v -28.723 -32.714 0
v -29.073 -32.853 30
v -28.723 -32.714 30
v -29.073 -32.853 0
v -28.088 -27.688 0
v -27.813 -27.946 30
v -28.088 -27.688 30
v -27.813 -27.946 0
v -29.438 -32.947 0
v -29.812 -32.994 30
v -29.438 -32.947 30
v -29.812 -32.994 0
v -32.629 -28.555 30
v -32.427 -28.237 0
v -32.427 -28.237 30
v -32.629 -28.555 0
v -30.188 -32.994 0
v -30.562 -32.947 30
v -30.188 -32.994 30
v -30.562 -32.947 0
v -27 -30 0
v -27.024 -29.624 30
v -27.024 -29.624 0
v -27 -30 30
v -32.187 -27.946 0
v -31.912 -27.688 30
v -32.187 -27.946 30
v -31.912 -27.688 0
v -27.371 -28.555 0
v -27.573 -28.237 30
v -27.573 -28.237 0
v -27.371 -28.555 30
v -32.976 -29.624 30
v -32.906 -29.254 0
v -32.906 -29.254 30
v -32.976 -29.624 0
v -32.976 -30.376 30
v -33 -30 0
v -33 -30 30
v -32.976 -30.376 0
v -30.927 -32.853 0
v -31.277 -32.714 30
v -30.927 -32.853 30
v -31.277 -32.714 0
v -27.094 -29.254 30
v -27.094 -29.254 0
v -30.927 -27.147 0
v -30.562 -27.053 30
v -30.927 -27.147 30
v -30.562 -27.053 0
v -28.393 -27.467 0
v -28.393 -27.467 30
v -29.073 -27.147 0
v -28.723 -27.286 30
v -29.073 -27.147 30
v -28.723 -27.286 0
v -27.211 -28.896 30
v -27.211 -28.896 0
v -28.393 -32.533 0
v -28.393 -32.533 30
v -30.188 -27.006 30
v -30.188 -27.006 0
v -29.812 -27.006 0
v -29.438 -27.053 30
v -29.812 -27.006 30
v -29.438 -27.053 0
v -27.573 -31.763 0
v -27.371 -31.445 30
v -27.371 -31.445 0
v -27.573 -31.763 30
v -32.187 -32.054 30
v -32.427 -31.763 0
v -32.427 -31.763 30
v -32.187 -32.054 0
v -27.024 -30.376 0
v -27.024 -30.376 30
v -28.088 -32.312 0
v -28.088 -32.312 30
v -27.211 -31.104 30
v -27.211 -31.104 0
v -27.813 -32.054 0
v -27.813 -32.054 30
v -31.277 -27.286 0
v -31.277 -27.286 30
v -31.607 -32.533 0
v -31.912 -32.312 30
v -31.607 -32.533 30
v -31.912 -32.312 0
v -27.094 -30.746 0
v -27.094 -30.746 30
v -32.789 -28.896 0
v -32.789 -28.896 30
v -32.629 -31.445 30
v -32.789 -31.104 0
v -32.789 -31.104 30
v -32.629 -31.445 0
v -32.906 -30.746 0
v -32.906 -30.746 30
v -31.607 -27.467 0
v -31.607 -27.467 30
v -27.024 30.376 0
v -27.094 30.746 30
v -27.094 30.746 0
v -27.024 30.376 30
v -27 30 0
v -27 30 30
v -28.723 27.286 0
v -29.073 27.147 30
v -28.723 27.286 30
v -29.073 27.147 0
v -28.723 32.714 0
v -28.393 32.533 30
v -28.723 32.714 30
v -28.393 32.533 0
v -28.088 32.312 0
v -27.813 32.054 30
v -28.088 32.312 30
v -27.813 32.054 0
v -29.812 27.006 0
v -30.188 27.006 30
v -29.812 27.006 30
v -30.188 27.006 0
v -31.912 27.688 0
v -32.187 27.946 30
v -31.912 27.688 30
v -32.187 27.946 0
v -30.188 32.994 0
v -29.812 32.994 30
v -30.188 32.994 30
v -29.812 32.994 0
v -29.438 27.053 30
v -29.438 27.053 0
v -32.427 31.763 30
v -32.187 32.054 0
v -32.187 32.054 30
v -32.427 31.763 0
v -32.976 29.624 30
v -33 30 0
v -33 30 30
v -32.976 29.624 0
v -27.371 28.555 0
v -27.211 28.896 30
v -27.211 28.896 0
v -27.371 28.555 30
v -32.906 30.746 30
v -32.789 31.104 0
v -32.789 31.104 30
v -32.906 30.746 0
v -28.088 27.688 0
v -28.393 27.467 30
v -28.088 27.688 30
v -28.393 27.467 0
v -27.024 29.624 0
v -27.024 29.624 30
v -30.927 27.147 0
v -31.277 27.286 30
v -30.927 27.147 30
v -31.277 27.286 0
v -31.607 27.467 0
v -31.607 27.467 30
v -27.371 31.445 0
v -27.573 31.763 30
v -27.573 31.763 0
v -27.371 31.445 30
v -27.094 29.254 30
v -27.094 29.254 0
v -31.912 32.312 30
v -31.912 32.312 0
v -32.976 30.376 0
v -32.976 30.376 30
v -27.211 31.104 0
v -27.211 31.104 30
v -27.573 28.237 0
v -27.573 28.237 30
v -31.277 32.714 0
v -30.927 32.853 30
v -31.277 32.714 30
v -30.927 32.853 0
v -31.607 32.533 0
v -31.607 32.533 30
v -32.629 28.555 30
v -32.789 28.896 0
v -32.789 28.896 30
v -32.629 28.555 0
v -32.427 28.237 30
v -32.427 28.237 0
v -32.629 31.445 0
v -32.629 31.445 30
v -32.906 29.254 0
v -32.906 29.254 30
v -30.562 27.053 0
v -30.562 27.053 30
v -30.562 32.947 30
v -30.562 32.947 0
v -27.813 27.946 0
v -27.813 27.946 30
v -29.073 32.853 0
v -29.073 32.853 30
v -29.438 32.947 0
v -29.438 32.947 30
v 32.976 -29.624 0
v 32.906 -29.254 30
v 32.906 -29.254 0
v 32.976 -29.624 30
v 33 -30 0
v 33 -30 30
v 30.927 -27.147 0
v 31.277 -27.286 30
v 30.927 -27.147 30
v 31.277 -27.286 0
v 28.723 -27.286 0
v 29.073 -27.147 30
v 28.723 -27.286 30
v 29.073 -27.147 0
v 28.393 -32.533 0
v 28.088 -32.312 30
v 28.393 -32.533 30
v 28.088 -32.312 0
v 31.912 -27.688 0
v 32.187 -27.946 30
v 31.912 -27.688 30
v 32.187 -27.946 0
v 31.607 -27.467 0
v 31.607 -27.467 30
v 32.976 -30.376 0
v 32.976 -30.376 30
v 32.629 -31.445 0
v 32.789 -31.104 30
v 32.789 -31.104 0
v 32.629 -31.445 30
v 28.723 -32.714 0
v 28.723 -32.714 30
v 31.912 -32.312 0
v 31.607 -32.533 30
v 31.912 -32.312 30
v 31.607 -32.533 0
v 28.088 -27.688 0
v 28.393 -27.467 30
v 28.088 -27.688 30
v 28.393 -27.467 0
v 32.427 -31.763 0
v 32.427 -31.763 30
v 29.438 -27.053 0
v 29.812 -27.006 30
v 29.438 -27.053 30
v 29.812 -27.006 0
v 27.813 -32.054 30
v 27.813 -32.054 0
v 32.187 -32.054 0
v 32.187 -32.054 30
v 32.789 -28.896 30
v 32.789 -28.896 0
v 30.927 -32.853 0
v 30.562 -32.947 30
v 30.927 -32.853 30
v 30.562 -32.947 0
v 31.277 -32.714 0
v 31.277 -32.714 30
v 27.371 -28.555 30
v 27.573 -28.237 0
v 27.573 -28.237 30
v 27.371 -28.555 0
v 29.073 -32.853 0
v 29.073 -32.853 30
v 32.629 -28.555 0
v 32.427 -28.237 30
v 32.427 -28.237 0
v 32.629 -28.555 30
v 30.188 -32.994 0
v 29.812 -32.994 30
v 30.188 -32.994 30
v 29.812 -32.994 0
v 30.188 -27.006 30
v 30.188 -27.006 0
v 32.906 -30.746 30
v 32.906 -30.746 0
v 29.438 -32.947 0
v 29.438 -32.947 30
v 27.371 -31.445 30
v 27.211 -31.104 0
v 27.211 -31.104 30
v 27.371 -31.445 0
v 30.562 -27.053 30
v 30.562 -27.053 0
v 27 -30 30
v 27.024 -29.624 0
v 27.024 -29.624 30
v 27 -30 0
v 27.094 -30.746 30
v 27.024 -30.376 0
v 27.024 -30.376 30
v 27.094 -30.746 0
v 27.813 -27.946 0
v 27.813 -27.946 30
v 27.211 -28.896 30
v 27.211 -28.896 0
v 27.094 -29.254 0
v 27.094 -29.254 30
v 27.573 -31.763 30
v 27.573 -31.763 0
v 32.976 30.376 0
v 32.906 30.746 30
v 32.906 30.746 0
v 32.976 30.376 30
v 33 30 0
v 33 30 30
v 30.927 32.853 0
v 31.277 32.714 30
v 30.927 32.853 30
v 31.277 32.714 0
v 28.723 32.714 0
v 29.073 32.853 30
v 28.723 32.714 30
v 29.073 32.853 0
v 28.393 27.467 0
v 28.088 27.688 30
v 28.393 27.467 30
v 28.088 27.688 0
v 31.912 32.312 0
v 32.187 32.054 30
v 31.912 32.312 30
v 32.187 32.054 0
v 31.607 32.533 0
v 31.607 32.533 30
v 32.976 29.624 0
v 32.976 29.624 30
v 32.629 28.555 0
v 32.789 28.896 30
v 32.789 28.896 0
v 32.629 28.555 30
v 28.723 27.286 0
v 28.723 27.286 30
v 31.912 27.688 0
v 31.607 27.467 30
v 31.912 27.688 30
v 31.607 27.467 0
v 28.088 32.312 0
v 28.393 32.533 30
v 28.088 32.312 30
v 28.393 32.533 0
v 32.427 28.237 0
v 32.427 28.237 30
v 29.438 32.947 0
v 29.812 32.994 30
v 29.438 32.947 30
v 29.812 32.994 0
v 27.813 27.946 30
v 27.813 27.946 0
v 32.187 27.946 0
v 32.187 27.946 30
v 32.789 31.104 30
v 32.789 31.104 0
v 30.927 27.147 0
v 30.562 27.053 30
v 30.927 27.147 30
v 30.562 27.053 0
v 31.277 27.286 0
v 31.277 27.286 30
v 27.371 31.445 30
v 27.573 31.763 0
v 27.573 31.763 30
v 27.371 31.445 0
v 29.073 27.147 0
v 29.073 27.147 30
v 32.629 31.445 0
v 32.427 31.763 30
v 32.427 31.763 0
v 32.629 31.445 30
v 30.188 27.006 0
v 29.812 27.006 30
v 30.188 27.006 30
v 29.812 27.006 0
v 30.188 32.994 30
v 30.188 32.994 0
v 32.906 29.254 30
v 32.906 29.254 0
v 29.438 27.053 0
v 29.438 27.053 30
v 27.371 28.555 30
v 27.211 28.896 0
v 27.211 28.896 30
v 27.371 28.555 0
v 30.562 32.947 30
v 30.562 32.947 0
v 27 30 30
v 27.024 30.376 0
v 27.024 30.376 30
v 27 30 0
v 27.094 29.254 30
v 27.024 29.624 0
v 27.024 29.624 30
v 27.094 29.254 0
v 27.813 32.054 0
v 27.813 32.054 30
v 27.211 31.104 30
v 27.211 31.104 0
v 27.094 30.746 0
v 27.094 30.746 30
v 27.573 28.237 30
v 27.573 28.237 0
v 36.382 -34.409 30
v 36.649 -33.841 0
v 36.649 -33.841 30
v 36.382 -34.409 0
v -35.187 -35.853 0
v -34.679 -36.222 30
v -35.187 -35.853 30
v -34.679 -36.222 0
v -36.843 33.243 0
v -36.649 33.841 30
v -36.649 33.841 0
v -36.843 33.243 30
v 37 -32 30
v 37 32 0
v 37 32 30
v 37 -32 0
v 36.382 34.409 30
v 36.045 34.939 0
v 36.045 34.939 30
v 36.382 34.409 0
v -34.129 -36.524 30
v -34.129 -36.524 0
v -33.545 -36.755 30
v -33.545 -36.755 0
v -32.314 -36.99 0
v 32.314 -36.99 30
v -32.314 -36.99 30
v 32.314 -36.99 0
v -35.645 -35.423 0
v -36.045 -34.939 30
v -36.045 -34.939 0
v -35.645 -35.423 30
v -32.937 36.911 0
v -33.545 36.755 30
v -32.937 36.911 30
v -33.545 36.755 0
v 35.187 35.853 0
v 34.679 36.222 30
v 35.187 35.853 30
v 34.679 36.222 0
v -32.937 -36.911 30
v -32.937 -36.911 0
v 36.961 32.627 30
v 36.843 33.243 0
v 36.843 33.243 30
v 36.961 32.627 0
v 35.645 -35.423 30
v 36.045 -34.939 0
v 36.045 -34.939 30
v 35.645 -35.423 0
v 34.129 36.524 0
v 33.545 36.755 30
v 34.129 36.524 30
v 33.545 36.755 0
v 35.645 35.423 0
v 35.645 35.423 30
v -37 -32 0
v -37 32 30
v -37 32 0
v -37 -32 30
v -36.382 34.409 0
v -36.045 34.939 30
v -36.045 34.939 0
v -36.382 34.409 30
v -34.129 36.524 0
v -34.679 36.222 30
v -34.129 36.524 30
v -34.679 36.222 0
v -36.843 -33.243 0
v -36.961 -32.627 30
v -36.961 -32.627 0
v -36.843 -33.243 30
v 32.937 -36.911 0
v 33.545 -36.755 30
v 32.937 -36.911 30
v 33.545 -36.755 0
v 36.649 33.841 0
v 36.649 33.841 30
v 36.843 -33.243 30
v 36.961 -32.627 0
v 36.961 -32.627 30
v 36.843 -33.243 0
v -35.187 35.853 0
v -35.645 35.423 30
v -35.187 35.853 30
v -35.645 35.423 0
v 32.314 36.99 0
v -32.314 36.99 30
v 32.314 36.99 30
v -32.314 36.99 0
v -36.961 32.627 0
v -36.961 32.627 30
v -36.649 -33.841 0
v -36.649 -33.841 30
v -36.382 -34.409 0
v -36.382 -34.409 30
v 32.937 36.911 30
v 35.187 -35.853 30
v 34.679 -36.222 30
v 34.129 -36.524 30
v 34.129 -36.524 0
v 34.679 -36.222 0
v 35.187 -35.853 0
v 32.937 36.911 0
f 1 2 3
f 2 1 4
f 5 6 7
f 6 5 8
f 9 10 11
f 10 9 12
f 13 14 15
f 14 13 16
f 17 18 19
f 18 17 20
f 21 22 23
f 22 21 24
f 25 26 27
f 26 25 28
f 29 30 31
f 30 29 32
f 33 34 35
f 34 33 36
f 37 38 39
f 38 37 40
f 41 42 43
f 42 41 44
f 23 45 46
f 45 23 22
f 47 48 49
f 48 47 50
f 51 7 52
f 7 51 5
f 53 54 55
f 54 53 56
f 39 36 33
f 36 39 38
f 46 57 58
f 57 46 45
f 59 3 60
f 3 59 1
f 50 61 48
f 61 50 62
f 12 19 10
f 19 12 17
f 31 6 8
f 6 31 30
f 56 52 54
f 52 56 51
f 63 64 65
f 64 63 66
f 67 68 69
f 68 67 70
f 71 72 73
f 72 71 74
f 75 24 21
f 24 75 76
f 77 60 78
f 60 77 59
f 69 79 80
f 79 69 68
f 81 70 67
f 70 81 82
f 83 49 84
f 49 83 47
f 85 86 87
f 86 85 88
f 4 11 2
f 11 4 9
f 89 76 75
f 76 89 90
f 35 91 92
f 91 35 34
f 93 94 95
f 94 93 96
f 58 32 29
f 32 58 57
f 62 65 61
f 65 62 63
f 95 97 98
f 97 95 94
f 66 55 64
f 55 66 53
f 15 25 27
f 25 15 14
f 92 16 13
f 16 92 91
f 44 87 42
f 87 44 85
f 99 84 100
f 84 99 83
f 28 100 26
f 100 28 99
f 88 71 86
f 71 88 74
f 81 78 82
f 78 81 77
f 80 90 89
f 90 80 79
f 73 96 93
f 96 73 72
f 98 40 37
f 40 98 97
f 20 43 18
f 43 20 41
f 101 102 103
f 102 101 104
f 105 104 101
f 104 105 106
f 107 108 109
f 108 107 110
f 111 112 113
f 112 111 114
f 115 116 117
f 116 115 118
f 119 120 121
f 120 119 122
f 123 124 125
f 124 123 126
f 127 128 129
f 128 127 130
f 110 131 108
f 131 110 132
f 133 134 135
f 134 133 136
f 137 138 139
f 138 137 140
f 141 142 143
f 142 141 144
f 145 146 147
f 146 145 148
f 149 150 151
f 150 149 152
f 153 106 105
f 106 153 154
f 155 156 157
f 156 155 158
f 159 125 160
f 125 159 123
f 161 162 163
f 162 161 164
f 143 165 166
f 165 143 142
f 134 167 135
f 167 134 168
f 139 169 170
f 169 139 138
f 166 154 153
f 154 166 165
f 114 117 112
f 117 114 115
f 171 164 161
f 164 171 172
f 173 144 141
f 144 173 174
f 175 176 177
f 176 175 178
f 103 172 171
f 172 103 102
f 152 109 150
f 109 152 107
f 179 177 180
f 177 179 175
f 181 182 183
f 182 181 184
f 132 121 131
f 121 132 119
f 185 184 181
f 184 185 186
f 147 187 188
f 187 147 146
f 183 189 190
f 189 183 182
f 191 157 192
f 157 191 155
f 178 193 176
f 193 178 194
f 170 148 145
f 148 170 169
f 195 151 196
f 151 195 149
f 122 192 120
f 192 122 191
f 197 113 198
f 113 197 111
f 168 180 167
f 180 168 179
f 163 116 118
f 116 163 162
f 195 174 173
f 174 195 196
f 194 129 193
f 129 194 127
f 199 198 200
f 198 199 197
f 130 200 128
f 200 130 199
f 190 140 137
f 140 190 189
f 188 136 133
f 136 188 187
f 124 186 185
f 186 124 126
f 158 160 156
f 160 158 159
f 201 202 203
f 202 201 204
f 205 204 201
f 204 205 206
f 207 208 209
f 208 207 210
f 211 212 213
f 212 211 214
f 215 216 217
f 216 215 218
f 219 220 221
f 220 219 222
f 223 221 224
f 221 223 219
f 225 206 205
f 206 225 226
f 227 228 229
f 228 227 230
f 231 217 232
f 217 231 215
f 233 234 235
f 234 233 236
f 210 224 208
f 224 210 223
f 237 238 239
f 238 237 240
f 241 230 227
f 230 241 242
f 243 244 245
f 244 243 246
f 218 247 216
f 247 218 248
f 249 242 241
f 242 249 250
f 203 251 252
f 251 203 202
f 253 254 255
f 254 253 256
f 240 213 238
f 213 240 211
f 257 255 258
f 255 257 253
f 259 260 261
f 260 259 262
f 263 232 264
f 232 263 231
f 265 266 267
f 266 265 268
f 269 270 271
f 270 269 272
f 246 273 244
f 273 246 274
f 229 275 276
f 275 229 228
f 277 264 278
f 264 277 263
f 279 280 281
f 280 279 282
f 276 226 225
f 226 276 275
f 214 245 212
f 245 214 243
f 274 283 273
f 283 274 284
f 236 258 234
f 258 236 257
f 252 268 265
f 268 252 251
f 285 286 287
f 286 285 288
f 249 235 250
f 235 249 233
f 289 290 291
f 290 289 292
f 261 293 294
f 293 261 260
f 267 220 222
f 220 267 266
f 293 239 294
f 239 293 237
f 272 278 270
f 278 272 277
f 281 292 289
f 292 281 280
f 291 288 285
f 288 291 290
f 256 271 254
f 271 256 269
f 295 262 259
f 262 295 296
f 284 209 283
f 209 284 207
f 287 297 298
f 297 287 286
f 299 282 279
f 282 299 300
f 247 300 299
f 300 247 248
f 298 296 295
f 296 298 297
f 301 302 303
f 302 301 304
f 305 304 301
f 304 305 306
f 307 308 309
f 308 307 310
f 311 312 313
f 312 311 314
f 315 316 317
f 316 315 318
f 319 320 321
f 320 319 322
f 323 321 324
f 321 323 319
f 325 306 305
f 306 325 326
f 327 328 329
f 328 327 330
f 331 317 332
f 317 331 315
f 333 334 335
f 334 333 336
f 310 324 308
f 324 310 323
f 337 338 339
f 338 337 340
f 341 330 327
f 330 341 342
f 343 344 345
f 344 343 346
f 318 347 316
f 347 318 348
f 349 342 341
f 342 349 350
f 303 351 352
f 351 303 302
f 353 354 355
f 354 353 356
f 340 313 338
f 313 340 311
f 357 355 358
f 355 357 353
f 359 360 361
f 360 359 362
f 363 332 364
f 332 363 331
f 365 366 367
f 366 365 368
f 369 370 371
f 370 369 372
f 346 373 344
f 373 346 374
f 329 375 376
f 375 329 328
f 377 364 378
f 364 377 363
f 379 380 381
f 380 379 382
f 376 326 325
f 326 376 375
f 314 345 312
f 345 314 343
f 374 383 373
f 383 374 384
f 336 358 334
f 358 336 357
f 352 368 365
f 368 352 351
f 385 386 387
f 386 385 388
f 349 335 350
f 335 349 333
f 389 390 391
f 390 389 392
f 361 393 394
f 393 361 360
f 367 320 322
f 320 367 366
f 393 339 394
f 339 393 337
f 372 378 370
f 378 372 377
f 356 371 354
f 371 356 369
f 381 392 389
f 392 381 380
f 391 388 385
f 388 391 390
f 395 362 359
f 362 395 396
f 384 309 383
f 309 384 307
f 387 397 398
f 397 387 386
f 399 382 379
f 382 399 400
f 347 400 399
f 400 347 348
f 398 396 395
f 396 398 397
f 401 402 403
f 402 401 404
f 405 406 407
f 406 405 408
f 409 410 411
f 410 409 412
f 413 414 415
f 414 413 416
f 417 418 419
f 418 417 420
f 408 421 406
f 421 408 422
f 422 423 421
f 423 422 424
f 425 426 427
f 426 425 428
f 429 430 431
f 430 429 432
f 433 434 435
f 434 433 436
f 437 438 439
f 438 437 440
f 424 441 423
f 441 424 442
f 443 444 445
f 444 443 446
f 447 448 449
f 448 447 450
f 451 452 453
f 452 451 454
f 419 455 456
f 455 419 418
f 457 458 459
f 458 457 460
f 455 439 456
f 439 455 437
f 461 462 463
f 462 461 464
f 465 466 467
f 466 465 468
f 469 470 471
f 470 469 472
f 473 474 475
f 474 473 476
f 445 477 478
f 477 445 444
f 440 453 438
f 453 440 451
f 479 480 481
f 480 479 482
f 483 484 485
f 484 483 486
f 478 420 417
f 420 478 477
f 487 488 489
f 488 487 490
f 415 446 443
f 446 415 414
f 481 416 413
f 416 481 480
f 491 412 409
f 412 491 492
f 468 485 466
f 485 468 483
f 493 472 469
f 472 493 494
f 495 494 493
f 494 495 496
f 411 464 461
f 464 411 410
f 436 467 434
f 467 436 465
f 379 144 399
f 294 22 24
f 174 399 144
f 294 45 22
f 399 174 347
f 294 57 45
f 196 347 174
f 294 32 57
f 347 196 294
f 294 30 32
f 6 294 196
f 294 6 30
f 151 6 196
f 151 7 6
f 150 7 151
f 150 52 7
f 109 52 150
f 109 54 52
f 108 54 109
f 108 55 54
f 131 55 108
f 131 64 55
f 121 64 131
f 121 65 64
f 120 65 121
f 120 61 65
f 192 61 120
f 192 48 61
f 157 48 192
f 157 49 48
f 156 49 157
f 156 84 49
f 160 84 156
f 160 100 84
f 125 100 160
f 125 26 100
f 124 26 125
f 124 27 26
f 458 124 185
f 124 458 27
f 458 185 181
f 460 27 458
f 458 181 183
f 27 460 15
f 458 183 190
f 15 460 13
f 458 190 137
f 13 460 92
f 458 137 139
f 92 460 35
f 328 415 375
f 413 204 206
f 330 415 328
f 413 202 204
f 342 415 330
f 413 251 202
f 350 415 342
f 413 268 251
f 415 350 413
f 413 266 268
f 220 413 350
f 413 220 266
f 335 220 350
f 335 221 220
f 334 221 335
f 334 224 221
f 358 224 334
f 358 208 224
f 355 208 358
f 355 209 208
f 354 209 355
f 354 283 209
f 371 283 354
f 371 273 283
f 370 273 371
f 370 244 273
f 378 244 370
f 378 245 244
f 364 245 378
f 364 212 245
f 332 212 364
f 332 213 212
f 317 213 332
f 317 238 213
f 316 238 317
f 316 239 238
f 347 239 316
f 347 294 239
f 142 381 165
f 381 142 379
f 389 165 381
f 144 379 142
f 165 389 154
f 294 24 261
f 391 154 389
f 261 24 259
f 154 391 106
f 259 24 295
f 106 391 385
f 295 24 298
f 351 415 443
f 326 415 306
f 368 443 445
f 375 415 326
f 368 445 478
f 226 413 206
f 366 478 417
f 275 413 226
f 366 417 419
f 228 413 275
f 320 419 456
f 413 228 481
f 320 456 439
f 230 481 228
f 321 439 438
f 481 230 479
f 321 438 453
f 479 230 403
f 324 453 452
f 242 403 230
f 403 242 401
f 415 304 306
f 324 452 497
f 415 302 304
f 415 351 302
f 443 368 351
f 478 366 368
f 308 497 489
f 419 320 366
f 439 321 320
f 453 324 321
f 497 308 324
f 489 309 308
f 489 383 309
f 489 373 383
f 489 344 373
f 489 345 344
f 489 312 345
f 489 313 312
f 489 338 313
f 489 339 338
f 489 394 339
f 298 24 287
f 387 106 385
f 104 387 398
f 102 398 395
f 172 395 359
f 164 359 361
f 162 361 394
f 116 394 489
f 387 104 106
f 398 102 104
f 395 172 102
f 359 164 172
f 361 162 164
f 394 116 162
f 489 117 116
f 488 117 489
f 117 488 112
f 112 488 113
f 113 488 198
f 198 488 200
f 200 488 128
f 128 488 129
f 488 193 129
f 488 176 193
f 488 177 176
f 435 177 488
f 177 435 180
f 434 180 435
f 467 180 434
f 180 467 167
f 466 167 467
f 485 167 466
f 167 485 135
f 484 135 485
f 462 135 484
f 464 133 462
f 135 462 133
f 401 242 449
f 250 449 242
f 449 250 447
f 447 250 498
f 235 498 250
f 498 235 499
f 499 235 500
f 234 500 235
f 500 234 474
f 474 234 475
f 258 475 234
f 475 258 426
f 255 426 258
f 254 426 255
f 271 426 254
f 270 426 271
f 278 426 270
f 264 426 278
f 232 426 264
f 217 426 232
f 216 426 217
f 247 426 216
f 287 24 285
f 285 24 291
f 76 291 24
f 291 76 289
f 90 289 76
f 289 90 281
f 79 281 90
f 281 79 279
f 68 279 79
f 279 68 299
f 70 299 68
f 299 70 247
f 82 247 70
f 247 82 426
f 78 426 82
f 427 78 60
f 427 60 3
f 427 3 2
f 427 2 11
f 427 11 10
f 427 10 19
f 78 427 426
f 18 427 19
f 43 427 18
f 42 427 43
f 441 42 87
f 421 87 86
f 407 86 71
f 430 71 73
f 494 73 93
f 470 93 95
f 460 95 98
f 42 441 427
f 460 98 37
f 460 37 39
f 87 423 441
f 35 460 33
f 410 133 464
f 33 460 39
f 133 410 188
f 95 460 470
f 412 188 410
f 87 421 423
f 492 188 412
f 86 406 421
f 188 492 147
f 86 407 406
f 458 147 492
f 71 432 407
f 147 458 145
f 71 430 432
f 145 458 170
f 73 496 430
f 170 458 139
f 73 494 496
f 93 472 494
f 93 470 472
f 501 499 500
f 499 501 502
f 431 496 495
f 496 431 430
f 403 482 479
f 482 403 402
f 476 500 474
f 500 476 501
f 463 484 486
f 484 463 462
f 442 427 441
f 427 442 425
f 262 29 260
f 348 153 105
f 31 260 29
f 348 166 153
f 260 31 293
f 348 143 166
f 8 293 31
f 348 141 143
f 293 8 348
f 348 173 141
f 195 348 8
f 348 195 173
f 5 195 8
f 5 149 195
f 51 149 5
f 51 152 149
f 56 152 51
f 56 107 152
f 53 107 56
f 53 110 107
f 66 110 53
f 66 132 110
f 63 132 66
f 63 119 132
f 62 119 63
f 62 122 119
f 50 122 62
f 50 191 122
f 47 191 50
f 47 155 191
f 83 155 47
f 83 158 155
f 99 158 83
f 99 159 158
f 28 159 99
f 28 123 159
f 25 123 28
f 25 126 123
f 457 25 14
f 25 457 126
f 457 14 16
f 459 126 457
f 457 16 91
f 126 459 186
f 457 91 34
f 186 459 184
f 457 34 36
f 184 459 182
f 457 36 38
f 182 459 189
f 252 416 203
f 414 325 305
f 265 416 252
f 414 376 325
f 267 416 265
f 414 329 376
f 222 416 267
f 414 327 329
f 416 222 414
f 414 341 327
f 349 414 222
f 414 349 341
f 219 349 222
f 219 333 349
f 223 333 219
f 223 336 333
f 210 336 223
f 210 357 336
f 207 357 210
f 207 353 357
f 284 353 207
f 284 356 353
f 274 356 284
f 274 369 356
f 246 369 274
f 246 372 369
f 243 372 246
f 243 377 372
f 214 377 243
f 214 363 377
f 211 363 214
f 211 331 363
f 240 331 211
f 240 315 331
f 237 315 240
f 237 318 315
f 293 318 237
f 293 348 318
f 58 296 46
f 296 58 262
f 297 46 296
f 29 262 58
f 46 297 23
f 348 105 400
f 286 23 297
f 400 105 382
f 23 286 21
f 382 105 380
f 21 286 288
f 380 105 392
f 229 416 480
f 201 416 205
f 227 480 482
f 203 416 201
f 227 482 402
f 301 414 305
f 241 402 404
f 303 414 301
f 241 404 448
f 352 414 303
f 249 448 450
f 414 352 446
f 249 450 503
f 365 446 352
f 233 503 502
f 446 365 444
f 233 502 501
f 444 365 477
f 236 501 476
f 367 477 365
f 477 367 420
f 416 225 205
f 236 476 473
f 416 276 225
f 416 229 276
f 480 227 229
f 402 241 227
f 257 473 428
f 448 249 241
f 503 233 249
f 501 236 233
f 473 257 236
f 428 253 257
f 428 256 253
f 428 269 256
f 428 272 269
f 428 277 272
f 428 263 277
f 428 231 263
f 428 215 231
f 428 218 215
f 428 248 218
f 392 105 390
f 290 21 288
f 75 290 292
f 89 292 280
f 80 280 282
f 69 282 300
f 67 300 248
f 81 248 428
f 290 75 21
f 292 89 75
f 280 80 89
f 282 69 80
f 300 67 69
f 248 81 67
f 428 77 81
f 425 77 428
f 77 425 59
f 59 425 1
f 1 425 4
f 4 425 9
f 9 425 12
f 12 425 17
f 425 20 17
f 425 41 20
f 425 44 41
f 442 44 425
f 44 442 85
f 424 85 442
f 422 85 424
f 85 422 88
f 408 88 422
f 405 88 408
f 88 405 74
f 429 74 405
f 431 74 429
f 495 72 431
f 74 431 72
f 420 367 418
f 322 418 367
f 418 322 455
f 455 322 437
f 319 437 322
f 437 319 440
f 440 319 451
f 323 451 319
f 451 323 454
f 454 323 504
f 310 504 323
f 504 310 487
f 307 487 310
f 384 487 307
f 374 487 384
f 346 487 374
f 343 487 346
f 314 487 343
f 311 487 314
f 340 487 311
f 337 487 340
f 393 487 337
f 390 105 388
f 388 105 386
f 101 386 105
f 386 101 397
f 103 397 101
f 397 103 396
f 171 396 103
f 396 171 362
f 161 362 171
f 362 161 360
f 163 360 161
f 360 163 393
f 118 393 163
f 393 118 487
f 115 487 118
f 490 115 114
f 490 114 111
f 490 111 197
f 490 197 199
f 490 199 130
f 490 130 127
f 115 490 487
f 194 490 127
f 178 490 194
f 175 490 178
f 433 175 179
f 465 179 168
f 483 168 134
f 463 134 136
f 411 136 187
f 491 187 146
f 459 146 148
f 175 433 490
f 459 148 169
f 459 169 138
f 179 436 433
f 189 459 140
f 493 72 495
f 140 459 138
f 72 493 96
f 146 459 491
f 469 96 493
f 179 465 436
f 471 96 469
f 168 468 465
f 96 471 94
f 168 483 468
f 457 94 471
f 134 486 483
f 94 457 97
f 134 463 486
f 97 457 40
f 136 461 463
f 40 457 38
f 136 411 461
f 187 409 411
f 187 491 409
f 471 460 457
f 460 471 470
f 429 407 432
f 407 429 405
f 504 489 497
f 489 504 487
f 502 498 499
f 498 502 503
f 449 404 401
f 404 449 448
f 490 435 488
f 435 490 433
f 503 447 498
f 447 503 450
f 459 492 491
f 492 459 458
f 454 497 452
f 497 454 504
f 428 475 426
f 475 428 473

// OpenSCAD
$fn = 50;


difference() {
	union() {
		hull() {
			translate(v = [-32.0000000000, 32.0000000000, 0]) {
				cylinder(h = 30, r = 5);
			}
			translate(v = [32.0000000000, 32.0000000000, 0]) {
				cylinder(h = 30, r = 5);
			}
			translate(v = [-32.0000000000, -32.0000000000, 0]) {
				cylinder(h = 30, r = 5);
			}
			translate(v = [32.0000000000, -32.0000000000, 0]) {
				cylinder(h = 30, r = 5);
			}
		}
	}
	union() {
		translate(v = [-30.0000000000, -30.0000000000, -100.0000000000]) {
			cylinder(h = 200, r = 3.0000000000);
		}
		translate(v = [-30.0000000000, 30.0000000000, -100.0000000000]) {
			cylinder(h = 200, r = 3.0000000000);
		}
		translate(v = [30.0000000000, -30.0000000000, -100.0000000000]) {
			cylinder(h = 200, r = 3.0000000000);
		}
		translate(v = [30.0000000000, 30.0000000000, -100.0000000000]) {
			cylinder(h = 200, r = 3.0000000000);
		}
	}
}
